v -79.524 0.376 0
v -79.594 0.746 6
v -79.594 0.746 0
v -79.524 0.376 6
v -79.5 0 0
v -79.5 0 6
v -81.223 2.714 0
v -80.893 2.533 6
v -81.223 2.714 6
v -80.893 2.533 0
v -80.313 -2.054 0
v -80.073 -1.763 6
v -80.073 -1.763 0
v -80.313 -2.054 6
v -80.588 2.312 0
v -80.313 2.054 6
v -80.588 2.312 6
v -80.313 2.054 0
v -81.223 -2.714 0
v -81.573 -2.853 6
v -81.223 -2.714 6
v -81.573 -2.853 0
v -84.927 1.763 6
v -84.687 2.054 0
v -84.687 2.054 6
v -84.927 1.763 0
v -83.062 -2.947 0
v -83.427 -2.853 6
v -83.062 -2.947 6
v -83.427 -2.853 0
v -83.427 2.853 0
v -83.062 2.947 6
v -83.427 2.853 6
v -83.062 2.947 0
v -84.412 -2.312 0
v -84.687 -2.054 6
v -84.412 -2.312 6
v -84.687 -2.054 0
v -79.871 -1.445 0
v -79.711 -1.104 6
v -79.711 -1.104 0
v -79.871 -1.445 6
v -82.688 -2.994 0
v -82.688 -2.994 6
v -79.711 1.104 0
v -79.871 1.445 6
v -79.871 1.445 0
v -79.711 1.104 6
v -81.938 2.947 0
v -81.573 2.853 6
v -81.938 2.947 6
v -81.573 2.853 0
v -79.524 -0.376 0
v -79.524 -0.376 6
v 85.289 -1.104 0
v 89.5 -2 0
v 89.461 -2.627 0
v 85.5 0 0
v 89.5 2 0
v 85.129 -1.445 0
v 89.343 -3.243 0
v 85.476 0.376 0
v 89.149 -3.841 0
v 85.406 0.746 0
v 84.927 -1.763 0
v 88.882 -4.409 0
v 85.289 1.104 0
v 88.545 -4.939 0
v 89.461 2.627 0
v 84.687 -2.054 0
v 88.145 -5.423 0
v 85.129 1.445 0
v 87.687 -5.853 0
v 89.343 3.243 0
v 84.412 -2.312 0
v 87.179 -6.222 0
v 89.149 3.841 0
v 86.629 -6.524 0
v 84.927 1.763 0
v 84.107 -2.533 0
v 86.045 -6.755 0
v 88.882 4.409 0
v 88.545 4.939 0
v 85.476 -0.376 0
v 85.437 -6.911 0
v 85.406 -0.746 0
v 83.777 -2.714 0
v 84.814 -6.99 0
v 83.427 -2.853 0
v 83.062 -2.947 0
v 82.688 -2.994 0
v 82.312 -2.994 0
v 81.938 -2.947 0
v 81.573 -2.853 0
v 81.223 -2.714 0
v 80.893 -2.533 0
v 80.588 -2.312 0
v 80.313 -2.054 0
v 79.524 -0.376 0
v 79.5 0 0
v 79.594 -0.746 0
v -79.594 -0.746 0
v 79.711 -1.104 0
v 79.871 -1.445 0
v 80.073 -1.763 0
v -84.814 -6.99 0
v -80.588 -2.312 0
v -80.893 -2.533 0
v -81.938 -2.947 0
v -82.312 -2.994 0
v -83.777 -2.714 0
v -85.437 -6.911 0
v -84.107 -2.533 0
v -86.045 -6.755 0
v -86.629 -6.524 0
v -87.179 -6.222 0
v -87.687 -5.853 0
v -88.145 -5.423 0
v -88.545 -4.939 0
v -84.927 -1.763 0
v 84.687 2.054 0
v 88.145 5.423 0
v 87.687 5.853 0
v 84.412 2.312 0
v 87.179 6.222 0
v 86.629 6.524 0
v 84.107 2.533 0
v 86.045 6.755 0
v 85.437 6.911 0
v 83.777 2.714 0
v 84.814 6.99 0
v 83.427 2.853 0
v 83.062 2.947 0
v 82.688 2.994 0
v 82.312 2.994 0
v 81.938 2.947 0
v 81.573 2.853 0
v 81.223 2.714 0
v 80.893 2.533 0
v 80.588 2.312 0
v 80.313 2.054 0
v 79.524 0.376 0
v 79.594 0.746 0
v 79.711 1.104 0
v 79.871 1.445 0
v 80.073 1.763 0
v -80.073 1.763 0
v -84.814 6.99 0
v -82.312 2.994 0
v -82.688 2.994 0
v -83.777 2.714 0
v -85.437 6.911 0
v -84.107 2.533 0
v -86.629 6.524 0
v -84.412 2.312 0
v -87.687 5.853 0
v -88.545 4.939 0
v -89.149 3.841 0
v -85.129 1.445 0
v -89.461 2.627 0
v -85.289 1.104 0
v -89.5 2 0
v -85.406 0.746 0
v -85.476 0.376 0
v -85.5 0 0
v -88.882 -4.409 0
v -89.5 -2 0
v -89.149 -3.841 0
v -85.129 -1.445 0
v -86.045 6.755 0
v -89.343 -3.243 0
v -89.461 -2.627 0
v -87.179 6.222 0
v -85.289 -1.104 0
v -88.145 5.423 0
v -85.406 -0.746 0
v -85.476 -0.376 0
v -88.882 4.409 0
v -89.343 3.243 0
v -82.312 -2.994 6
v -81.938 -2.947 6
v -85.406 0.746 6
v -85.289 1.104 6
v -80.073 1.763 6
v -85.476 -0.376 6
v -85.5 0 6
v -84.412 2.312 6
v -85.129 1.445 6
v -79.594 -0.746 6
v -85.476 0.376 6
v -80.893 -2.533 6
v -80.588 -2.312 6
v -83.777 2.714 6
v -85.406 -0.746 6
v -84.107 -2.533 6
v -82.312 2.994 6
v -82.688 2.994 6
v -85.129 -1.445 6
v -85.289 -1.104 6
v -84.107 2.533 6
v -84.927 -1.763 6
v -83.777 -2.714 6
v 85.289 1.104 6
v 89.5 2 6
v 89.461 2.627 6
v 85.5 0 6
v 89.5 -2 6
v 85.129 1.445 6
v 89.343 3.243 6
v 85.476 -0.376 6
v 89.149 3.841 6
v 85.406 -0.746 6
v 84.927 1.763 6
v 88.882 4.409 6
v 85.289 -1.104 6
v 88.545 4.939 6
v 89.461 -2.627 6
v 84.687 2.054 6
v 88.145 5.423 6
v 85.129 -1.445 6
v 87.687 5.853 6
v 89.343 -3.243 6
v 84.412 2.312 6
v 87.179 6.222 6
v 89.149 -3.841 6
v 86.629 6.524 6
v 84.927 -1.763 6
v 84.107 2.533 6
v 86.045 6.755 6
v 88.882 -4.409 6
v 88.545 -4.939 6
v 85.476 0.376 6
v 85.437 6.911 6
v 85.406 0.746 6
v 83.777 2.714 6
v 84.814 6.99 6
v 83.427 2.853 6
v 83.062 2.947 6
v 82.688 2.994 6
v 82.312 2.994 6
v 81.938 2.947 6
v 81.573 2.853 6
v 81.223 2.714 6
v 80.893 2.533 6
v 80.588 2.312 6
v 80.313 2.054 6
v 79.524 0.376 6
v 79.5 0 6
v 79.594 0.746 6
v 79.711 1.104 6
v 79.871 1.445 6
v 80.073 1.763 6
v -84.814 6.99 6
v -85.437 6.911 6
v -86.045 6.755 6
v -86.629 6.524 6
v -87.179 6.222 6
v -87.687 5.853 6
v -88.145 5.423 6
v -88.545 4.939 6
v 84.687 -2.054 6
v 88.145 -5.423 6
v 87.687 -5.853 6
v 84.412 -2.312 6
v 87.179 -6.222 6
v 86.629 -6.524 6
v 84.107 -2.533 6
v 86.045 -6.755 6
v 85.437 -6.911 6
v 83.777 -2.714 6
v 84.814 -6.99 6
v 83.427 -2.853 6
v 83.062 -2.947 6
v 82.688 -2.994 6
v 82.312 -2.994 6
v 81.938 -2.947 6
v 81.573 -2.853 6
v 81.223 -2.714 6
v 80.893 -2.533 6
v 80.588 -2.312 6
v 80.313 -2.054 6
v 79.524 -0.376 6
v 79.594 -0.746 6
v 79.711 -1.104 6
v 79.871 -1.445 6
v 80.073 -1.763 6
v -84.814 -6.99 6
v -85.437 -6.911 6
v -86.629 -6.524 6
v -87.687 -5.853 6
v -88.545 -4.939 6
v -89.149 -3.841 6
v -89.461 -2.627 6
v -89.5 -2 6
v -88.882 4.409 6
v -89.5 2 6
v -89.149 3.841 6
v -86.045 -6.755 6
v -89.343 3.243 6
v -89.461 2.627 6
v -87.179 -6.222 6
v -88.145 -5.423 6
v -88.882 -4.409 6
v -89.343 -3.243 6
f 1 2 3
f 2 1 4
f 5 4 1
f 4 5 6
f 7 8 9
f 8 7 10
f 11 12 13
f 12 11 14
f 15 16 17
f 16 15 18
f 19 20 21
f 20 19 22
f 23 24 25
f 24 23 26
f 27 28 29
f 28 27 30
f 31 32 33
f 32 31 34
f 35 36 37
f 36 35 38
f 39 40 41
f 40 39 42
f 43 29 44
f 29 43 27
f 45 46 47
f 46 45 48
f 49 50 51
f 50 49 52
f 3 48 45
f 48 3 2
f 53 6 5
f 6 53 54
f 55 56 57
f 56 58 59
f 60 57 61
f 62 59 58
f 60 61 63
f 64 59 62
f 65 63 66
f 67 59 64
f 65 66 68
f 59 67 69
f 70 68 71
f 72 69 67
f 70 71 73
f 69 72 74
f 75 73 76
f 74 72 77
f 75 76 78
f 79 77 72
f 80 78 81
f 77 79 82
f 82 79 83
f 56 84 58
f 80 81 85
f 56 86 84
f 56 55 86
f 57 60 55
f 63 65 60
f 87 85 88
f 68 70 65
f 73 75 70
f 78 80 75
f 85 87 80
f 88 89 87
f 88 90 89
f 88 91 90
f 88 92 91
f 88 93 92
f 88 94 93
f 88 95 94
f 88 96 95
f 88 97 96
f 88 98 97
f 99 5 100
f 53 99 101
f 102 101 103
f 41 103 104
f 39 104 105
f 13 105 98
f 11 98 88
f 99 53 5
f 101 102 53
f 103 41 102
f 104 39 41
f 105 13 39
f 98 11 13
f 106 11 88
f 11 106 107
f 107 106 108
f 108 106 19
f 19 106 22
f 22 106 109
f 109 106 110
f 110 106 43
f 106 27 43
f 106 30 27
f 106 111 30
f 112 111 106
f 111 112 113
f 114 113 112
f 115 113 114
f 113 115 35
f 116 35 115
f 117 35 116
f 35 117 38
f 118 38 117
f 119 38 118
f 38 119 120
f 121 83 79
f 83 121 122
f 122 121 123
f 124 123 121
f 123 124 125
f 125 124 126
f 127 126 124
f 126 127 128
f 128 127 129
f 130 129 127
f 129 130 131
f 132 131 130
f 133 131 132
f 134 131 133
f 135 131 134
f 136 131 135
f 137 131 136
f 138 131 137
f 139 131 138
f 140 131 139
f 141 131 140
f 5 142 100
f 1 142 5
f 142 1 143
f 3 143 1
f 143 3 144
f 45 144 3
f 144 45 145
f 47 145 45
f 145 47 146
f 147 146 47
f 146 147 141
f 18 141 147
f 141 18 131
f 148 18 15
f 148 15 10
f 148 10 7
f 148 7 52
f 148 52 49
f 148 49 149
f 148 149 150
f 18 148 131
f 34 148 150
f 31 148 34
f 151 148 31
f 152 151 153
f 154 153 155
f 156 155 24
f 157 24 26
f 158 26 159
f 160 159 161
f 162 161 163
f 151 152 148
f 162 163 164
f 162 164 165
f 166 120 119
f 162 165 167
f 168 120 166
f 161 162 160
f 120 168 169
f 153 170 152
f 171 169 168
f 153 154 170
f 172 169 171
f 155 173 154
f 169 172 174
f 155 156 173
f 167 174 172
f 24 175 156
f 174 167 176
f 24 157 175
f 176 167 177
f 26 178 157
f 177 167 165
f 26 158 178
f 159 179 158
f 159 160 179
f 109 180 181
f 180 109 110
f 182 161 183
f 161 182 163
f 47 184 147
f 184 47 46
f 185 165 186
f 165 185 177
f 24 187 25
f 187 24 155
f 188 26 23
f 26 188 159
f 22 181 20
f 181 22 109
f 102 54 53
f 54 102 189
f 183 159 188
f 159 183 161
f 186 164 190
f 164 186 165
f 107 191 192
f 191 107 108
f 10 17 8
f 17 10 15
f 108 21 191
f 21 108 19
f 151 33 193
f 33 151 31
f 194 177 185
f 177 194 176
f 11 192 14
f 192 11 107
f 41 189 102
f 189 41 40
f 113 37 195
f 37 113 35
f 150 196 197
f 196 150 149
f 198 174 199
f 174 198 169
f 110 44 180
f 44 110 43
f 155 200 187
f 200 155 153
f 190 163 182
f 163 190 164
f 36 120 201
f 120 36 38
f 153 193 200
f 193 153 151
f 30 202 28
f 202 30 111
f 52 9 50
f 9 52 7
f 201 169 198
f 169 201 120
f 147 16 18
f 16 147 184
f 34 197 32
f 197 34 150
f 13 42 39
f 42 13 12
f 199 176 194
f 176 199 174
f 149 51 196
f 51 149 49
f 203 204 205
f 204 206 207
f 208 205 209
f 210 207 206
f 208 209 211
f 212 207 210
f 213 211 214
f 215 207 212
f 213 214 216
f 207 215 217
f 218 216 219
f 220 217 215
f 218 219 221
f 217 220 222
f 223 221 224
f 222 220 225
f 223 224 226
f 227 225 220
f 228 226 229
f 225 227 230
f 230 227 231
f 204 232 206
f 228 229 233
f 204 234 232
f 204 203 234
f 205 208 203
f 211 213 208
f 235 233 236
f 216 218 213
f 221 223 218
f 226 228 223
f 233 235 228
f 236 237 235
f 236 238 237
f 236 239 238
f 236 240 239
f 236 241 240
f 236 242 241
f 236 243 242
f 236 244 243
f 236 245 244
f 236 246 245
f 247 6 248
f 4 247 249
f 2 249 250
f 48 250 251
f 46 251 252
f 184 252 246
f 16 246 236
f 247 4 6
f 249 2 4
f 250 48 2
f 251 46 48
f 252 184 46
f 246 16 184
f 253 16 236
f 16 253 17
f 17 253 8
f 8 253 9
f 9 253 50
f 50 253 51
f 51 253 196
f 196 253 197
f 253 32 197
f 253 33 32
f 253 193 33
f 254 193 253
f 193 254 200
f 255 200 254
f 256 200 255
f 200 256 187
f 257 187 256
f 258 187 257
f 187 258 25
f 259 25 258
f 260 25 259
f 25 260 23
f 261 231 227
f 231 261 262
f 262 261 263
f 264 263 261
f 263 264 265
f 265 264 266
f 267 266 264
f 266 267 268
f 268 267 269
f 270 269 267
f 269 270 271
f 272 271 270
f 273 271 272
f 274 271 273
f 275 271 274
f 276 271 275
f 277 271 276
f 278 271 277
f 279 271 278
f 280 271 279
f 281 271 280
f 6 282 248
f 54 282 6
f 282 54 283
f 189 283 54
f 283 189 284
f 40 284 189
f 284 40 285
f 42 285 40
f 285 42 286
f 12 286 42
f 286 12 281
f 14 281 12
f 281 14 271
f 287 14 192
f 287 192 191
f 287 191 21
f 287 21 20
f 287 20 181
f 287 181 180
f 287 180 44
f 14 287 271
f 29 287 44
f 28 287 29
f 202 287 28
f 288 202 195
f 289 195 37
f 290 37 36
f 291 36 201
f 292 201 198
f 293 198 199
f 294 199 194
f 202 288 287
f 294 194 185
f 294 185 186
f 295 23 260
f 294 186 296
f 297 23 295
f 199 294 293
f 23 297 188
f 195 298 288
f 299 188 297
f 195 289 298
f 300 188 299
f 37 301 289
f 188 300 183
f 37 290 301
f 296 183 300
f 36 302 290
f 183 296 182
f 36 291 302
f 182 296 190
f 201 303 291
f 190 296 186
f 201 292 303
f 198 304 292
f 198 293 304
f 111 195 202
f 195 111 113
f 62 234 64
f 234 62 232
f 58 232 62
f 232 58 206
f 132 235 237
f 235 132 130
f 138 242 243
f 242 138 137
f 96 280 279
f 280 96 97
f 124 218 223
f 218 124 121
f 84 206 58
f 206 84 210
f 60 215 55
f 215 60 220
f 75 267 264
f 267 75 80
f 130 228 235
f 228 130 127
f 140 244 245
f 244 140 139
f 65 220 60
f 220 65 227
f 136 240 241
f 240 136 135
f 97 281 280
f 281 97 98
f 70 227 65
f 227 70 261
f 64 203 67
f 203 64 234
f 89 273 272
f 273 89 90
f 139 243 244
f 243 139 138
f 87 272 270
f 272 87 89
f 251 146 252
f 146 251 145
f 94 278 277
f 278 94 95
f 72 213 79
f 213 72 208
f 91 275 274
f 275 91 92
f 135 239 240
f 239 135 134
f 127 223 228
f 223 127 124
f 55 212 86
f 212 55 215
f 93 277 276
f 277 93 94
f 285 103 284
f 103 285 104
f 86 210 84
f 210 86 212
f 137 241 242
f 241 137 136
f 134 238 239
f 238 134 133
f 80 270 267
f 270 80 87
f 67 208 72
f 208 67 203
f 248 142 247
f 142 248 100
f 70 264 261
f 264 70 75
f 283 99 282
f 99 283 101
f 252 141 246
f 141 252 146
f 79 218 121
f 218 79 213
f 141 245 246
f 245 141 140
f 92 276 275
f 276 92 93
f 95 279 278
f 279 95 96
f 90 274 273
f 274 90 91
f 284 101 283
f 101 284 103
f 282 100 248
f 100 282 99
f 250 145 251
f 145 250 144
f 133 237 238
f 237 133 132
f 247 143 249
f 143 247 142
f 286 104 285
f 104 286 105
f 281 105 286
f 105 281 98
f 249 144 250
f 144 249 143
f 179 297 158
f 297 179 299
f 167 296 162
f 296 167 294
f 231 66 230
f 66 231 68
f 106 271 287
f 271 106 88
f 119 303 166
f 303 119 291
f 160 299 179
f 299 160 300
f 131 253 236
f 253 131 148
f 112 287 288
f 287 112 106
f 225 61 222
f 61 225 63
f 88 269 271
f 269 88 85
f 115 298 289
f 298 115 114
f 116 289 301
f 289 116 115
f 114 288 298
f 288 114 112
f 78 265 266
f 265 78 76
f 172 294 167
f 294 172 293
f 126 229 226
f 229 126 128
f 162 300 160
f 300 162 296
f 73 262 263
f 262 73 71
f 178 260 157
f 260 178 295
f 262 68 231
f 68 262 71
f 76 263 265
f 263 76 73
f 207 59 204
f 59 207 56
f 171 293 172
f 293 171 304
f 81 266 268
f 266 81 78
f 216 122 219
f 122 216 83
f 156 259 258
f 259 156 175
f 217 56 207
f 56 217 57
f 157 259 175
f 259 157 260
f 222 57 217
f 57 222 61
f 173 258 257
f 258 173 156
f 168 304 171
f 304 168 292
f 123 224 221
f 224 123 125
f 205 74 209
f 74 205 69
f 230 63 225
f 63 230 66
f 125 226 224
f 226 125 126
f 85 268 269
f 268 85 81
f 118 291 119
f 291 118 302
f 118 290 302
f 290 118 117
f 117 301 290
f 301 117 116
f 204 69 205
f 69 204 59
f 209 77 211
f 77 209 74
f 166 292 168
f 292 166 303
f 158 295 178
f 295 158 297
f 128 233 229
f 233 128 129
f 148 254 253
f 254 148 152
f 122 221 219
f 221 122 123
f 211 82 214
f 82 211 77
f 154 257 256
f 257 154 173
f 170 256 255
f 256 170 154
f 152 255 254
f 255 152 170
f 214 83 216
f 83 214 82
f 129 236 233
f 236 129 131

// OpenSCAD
$fn = 50;


difference() {
	union() {
		hull() {
			translate(v = [-84.5000000000, 2.0000000000, 0]) {
				cylinder(h = 6, r = 5);
			}
			translate(v = [84.5000000000, 2.0000000000, 0]) {
				cylinder(h = 6, r = 5);
			}
			translate(v = [-84.5000000000, -2.0000000000, 0]) {
				cylinder(h = 6, r = 5);
			}
			translate(v = [84.5000000000, -2.0000000000, 0]) {
				cylinder(h = 6, r = 5);
			}
		}
	}
	union() {
		translate(v = [-82.5000000000, 0.0000000000, 0]) {
			cylinder(h = 6, r = 3.0000000000);
		}
		translate(v = [82.5000000000, 0.0000000000, 0]) {
			cylinder(h = 6, r = 3.0000000000);
		}
		translate(v = [-82.5000000000, 0.0000000000, 0]) {
			cylinder(h = 6, r = 1.5000000000);
		}
		translate(v = [82.5000000000, 0.0000000000, 0]) {
			cylinder(h = 6, r = 1.5000000000);
		}
		translate(v = [-82.5000000000, 0.0000000000, 0]) {
			cylinder(h = 6, r = 1.5000000000);
		}
		translate(v = [82.5000000000, 0.0000000000, 0]) {
			cylinder(h = 6, r = 1.5000000000);
		}
		translate(v = [-82.5000000000, 0.0000000000, 0]) {
			cylinder(h = 6, r = 1.5000000000);
		}
		translate(v = [82.5000000000, 0.0000000000, 0]) {
			cylinder(h = 6, r = 1.5000000000);
		}
	}
}
